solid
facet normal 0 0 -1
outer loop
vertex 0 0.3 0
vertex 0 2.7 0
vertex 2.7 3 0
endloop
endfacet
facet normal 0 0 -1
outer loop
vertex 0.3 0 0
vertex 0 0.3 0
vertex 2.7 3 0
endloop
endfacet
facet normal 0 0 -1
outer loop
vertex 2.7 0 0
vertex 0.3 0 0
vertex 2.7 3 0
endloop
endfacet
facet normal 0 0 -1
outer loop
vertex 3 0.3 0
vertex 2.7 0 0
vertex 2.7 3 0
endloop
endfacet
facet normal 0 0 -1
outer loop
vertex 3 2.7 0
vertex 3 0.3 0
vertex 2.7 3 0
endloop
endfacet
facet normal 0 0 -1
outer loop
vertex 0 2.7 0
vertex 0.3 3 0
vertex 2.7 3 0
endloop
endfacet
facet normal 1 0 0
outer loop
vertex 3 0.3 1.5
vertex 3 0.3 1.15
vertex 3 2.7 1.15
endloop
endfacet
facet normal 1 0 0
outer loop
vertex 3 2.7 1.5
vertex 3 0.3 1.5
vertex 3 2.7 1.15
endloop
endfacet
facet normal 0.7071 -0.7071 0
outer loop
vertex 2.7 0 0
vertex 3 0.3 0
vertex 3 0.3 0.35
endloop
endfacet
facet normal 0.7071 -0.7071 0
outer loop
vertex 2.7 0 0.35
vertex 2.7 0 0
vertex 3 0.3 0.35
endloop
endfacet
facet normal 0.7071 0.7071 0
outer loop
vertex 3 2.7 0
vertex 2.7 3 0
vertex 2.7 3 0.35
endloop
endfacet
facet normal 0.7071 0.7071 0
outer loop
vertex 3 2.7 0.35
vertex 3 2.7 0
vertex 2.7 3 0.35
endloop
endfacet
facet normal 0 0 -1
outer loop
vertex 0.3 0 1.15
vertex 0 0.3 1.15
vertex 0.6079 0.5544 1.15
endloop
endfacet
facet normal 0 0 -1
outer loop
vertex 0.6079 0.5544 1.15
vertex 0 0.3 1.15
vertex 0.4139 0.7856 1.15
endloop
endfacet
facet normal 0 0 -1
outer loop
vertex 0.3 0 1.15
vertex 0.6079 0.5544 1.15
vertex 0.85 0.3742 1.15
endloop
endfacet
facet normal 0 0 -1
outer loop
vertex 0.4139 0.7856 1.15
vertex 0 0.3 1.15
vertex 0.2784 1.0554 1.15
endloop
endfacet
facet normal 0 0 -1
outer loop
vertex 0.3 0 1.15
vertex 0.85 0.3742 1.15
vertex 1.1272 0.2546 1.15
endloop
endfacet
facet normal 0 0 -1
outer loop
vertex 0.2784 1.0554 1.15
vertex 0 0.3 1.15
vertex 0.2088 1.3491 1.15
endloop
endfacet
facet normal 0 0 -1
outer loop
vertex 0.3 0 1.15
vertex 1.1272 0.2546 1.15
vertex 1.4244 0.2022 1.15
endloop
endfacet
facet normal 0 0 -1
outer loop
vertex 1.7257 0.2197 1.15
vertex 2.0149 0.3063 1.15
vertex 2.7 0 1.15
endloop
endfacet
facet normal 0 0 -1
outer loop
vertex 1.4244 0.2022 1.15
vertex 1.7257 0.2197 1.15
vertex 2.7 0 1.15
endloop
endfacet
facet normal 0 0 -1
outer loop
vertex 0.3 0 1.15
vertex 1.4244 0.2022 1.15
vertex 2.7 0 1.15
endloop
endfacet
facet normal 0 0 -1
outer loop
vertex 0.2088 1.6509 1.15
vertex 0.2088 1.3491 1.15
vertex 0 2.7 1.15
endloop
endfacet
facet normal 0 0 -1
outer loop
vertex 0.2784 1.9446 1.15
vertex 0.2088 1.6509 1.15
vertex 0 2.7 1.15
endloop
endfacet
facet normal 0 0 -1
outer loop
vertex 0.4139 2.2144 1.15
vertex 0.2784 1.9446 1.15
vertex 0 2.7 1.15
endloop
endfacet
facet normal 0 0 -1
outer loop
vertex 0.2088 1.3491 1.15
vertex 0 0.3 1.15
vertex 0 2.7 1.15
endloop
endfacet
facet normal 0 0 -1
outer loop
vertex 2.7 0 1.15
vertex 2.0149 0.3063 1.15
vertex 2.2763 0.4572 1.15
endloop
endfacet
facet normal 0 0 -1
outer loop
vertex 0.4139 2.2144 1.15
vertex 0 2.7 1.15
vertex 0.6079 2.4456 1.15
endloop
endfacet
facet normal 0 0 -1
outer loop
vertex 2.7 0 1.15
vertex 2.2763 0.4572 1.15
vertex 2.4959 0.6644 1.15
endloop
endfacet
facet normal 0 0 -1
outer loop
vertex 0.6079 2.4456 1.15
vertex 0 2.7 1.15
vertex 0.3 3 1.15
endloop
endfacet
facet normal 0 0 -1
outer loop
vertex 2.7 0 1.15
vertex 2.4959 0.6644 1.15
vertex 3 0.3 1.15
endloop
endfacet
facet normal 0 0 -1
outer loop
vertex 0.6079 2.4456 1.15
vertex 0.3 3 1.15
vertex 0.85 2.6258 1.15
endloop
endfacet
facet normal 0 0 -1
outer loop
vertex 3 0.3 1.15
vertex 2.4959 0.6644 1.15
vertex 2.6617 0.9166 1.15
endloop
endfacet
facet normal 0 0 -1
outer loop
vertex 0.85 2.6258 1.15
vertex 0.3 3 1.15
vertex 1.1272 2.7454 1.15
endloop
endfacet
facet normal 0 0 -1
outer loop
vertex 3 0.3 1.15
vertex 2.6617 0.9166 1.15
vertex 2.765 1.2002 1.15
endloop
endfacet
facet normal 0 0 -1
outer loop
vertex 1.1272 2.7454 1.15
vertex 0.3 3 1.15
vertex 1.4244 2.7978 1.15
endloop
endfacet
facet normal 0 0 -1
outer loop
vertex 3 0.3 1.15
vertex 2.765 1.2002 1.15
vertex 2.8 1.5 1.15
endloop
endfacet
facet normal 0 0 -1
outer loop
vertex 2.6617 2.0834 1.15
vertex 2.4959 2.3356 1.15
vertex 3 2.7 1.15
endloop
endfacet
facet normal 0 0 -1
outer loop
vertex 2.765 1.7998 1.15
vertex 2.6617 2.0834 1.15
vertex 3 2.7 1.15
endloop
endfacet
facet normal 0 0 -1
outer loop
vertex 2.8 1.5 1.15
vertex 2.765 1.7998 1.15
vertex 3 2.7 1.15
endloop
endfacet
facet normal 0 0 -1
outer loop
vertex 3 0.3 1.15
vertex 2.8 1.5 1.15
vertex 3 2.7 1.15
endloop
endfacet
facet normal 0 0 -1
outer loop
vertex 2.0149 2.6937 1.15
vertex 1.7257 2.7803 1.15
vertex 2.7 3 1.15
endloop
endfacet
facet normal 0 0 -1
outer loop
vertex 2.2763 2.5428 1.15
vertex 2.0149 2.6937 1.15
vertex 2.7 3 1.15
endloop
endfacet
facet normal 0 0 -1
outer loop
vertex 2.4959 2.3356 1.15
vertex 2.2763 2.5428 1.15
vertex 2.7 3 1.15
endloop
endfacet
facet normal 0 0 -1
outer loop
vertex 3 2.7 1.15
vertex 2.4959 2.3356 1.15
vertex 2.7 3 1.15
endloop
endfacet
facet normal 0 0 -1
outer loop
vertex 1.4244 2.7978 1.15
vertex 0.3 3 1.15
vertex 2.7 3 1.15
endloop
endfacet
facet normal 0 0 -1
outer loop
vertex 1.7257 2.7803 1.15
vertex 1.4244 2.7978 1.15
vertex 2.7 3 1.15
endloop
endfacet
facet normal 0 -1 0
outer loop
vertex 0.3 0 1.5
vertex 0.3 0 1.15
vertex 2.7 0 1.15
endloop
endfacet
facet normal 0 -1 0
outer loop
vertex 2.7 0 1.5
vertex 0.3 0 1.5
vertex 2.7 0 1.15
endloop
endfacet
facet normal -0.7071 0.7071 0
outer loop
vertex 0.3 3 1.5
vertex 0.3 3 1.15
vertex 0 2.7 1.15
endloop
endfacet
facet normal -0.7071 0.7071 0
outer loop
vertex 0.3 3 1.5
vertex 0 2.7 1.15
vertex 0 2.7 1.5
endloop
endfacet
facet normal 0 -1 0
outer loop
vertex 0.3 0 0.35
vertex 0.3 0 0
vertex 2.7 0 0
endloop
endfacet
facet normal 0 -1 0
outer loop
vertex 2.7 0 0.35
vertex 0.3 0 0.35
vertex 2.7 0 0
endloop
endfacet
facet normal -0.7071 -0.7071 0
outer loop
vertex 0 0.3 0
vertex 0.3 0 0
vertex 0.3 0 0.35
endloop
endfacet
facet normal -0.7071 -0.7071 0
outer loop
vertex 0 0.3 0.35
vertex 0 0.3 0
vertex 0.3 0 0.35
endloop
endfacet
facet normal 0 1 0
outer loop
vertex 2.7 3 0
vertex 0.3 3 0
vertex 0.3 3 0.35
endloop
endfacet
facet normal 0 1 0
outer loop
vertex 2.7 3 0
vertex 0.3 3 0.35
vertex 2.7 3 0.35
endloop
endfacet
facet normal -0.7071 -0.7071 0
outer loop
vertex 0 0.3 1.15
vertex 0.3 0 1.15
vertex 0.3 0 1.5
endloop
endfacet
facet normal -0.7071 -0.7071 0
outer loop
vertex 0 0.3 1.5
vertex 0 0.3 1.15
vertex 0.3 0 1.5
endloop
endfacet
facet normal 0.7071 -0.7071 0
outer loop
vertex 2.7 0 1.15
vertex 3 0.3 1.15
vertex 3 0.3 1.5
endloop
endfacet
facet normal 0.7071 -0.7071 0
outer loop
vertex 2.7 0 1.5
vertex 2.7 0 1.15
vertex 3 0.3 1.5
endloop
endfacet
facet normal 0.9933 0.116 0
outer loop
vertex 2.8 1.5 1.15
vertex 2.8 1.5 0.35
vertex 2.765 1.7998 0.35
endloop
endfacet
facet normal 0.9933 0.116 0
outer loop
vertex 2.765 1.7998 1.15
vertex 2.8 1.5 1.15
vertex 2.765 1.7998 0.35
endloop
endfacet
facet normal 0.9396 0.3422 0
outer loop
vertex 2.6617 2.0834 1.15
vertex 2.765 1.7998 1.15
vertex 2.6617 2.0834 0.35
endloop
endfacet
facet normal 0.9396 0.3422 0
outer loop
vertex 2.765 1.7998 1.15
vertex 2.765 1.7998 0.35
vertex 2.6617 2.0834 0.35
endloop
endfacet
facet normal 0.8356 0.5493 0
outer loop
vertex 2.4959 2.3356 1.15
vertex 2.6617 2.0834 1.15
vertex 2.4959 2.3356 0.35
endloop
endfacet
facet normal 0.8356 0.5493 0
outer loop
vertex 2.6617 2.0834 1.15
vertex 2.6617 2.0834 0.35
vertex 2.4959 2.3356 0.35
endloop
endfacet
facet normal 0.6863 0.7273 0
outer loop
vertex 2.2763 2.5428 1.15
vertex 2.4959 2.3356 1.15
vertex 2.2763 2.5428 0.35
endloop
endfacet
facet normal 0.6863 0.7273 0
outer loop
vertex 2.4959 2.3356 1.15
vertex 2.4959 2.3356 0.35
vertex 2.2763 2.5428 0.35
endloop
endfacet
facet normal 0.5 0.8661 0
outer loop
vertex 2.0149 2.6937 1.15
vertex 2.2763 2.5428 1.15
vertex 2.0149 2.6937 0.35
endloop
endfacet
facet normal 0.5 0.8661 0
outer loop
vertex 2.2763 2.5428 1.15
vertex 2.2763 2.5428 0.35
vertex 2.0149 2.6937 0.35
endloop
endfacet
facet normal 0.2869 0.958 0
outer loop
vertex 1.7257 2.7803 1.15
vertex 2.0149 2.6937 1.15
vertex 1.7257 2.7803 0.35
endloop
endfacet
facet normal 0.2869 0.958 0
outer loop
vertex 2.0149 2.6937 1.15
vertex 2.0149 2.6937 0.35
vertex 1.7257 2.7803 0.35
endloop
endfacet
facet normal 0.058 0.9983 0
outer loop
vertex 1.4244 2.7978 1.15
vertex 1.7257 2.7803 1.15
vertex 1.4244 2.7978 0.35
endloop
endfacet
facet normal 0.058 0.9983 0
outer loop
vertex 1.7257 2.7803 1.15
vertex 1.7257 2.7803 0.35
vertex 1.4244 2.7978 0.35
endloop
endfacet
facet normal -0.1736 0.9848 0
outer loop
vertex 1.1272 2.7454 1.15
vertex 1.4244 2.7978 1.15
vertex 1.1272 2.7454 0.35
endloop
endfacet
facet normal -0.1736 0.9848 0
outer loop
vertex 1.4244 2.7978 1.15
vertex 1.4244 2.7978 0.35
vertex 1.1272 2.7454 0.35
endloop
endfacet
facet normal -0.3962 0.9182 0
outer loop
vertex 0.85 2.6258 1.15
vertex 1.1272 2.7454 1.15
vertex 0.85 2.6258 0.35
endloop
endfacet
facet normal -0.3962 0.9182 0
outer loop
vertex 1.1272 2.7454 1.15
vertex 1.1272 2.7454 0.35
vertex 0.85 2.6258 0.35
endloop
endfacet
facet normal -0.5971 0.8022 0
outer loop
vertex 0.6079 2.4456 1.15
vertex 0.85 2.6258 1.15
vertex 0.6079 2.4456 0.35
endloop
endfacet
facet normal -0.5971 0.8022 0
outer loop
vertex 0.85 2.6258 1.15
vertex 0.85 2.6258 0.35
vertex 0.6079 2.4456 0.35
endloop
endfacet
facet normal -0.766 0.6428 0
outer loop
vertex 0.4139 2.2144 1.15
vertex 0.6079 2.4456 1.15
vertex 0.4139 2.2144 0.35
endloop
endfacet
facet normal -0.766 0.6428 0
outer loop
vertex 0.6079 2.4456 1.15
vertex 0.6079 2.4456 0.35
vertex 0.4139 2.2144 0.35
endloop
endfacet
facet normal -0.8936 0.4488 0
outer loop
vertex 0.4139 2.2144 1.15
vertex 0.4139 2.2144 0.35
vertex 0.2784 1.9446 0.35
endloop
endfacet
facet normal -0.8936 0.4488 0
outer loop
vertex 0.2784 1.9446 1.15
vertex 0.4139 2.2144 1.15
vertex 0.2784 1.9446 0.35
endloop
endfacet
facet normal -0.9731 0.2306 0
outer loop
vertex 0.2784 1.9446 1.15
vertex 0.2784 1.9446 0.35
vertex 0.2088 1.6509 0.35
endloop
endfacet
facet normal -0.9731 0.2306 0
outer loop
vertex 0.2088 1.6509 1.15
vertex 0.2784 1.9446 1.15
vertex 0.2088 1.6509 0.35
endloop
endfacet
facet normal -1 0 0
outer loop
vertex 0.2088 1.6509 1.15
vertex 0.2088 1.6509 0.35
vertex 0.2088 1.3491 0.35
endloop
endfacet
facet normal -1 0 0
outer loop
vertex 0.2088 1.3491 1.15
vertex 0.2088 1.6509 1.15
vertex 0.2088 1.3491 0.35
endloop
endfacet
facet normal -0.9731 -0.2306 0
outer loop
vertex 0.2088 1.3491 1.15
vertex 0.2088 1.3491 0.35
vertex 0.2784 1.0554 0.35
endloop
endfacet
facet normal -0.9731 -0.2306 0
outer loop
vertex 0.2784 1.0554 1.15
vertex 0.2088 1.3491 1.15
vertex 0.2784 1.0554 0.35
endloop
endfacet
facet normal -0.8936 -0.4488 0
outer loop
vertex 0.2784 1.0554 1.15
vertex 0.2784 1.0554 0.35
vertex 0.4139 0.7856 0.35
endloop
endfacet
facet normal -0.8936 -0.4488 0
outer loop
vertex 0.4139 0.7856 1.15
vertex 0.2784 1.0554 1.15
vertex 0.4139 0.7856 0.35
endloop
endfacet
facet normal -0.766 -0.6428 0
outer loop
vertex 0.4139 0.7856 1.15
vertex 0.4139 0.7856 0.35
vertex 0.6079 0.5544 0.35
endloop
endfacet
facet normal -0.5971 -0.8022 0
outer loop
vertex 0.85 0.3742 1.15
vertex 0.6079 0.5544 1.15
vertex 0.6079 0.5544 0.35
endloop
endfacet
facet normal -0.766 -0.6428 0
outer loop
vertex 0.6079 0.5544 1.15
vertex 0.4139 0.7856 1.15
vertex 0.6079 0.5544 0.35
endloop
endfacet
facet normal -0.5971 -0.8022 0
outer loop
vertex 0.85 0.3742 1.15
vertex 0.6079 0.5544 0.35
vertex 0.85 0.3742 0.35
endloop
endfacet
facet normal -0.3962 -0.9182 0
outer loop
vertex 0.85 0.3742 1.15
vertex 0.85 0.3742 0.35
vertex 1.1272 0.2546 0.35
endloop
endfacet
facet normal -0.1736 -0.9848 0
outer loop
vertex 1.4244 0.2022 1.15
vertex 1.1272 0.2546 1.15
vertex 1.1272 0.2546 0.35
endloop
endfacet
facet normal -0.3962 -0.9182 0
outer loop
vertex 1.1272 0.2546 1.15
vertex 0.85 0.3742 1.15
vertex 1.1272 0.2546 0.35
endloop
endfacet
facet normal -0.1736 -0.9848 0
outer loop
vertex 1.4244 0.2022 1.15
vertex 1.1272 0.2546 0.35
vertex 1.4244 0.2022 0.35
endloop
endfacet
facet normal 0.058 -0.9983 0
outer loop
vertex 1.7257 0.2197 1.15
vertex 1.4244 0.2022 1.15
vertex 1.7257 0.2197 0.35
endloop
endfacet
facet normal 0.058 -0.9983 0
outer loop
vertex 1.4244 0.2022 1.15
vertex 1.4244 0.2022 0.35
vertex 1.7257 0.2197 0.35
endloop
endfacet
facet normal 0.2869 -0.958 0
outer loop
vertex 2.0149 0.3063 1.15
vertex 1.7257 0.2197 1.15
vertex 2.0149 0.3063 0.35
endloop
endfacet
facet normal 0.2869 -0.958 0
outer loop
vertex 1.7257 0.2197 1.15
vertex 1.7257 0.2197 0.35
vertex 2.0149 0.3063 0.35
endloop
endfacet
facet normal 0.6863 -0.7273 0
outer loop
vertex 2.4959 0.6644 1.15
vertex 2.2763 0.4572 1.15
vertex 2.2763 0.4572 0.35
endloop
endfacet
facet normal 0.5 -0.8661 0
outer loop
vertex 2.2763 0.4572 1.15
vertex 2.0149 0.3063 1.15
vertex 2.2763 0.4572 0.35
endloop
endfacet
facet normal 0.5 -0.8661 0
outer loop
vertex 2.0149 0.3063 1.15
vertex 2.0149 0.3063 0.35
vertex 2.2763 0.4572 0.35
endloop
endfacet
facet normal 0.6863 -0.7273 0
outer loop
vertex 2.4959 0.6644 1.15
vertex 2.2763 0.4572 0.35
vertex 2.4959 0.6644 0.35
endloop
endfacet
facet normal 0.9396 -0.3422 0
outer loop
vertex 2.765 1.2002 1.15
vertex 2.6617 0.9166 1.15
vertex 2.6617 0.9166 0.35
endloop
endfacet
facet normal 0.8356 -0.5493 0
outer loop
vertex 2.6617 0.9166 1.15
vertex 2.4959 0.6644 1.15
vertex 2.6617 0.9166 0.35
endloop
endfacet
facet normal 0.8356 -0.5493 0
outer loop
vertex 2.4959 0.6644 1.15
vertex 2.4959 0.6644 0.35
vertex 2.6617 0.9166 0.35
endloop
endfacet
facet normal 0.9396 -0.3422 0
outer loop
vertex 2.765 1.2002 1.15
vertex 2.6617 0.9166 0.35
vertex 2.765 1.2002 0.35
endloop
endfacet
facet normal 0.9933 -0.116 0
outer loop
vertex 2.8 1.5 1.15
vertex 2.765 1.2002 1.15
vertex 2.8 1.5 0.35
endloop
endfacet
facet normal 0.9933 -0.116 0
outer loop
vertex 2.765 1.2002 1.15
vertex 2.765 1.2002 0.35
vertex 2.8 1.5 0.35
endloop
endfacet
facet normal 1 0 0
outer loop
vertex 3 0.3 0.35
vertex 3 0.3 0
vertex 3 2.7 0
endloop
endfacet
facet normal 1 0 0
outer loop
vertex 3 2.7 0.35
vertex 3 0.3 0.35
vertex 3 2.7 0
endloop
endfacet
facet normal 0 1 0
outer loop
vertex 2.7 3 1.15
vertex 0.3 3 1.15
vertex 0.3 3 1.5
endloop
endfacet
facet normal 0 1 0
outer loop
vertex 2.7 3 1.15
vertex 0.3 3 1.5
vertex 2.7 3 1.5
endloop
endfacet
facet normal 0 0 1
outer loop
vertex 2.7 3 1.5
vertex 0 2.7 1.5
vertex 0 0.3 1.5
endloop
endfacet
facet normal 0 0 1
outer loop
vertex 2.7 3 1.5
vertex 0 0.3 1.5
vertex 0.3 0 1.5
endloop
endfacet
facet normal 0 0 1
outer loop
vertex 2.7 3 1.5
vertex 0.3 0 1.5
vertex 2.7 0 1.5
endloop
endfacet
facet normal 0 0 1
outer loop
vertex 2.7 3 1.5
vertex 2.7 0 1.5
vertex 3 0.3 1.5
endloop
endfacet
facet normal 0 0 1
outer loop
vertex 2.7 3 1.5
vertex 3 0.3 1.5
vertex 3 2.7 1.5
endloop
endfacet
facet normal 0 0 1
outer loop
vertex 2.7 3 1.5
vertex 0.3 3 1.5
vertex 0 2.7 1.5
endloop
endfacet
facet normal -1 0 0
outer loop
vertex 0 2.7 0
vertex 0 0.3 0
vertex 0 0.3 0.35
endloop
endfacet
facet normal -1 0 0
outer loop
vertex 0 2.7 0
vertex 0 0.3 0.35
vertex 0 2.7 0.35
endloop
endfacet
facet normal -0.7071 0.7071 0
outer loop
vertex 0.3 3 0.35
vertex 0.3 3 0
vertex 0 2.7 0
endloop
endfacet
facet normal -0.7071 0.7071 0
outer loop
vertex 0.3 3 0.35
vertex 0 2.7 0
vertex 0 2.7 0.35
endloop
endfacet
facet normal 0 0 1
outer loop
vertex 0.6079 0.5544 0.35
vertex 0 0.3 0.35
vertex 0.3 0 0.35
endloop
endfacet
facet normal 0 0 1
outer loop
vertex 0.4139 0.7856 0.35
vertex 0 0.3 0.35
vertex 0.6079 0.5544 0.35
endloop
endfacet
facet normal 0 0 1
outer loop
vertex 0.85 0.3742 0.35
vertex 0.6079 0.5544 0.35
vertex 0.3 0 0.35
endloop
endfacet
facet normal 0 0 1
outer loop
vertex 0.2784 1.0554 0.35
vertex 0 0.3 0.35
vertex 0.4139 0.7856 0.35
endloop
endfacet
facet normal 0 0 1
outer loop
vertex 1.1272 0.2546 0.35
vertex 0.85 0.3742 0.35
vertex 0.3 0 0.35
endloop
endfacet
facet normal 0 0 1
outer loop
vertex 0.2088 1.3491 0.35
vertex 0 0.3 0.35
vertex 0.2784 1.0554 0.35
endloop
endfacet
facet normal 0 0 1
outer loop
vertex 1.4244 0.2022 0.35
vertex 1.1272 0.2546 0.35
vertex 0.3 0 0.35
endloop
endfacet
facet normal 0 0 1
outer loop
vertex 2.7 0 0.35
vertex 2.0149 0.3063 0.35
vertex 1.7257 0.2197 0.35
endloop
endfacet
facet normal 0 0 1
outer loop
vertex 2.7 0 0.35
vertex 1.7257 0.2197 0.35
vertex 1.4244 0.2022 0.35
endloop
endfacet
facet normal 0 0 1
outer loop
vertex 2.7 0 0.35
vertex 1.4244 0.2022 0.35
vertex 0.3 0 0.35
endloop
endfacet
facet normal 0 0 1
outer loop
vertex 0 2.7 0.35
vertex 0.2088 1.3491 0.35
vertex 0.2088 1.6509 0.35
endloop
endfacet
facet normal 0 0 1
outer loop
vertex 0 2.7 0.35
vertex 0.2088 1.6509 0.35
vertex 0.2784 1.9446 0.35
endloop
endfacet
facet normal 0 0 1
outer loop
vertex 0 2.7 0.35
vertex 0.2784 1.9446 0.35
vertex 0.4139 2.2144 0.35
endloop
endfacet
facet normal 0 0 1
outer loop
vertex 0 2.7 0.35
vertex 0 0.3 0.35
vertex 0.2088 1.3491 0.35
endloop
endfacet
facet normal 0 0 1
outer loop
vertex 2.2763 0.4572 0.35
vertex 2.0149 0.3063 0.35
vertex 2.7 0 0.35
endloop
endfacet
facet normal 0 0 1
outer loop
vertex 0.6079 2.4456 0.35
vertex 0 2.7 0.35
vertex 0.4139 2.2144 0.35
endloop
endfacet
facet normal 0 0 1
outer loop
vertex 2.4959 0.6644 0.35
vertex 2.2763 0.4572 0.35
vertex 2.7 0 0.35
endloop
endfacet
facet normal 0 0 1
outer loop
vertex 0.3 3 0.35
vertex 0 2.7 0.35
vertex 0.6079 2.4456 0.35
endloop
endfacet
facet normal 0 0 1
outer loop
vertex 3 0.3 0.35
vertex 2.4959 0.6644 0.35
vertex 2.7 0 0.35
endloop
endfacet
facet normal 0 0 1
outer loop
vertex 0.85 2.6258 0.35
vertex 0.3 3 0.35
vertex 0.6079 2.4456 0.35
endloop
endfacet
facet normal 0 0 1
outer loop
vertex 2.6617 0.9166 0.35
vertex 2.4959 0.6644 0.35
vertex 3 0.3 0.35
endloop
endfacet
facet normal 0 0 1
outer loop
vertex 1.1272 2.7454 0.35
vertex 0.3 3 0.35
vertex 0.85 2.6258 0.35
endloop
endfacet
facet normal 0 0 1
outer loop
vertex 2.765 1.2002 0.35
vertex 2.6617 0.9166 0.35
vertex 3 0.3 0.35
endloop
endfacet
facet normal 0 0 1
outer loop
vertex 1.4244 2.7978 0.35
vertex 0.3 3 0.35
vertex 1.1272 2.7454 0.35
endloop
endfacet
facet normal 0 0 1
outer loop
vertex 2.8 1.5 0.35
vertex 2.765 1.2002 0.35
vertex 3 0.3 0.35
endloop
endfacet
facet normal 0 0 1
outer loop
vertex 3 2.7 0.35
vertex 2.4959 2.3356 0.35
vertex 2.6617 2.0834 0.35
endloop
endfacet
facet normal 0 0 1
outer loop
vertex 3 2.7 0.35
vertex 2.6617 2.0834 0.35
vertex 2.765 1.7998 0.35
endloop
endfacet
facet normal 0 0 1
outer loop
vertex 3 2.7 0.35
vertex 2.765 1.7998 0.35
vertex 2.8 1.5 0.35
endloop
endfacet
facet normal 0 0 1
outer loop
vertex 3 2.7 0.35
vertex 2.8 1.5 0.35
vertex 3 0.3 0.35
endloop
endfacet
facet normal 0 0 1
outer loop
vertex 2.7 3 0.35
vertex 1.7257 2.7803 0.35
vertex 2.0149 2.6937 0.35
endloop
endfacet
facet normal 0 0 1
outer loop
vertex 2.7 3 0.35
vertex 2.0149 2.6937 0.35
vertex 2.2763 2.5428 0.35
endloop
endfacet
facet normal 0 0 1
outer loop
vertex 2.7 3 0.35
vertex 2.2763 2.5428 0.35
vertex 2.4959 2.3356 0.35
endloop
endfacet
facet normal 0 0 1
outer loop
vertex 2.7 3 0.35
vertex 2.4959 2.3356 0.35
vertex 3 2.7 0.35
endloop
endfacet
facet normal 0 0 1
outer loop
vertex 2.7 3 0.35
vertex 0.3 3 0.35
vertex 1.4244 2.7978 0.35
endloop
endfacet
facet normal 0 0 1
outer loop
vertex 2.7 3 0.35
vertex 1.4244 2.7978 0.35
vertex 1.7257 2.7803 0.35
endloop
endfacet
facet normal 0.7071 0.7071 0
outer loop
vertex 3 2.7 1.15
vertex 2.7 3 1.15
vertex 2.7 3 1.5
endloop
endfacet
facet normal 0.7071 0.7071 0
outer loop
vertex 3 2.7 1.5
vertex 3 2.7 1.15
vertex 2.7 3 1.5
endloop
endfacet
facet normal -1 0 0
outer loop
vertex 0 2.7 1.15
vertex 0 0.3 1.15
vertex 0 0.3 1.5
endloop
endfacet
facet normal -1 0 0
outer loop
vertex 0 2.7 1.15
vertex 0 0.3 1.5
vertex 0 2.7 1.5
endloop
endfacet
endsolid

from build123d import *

# Parameters (mm, degrees)
BOX001_W        = 3
BOX001_H        = 3
BOX001_DEPTH    = 0.35
CHAMFER001_SIZE = 0.3
CYLINDER_R      = 1.3
CYLINDER_DEPTH  = 1.3
BOX_W           = 3
BOX_H           = 3
BOX_DEPTH       = 0.35
CHAMFER_SIZE    = 0.3


with BuildPart() as chamfer001:
    # Box001 → Box001 (new body)
    with BuildSketch(Plane.XY):
        with Locations((1.5, 1.5)):
            Rectangle(BOX001_W, BOX001_H)
    extrude(amount=BOX001_DEPTH)

    # Chamfer001
    chamfer001_edges = [chamfer001.edges().sort_by_distance(p)[0] for p in [
        (0, 0, 0.175),
        (0, 3, 0.175),
        (3, 0, 0.175),
        (3, 3, 0.175),
    ]]
    chamfer(chamfer001_edges, length=CHAMFER001_SIZE)


with BuildPart() as chamfer001_1:
    # Chamfer001 placement: moved
    add(chamfer001.part.moved(Location((0, 0, 1.15))))


with BuildPart() as henger:
    # Cylinder → Cylinder (new body)
    with BuildSketch(Plane(origin=(1.5, 1.5, 0.1), x_dir=(1, 0, 0), z_dir=(0, 0, 1))):
        Circle(CYLINDER_R)
    extrude(amount=CYLINDER_DEPTH)


with BuildPart() as fusion:
    # Box → Box (new body)
    with BuildSketch(Plane.XY):
        with Locations((1.5, 1.5)):
            Rectangle(BOX_W, BOX_H)
    extrude(amount=BOX_DEPTH)

    # Chamfer
    chamfer_edges = [fusion.edges().sort_by_distance(p)[0] for p in [
        (0, 0, 0.175),
        (0, 3, 0.175),
        (3, 0, 0.175),
        (3, 3, 0.175),
    ]]
    chamfer(chamfer_edges, length=CHAMFER_SIZE)

    # Fusion: union Chamfer001, Henger
    add(chamfer001_1.part)
    add(henger.part)


solid = fusion.part
